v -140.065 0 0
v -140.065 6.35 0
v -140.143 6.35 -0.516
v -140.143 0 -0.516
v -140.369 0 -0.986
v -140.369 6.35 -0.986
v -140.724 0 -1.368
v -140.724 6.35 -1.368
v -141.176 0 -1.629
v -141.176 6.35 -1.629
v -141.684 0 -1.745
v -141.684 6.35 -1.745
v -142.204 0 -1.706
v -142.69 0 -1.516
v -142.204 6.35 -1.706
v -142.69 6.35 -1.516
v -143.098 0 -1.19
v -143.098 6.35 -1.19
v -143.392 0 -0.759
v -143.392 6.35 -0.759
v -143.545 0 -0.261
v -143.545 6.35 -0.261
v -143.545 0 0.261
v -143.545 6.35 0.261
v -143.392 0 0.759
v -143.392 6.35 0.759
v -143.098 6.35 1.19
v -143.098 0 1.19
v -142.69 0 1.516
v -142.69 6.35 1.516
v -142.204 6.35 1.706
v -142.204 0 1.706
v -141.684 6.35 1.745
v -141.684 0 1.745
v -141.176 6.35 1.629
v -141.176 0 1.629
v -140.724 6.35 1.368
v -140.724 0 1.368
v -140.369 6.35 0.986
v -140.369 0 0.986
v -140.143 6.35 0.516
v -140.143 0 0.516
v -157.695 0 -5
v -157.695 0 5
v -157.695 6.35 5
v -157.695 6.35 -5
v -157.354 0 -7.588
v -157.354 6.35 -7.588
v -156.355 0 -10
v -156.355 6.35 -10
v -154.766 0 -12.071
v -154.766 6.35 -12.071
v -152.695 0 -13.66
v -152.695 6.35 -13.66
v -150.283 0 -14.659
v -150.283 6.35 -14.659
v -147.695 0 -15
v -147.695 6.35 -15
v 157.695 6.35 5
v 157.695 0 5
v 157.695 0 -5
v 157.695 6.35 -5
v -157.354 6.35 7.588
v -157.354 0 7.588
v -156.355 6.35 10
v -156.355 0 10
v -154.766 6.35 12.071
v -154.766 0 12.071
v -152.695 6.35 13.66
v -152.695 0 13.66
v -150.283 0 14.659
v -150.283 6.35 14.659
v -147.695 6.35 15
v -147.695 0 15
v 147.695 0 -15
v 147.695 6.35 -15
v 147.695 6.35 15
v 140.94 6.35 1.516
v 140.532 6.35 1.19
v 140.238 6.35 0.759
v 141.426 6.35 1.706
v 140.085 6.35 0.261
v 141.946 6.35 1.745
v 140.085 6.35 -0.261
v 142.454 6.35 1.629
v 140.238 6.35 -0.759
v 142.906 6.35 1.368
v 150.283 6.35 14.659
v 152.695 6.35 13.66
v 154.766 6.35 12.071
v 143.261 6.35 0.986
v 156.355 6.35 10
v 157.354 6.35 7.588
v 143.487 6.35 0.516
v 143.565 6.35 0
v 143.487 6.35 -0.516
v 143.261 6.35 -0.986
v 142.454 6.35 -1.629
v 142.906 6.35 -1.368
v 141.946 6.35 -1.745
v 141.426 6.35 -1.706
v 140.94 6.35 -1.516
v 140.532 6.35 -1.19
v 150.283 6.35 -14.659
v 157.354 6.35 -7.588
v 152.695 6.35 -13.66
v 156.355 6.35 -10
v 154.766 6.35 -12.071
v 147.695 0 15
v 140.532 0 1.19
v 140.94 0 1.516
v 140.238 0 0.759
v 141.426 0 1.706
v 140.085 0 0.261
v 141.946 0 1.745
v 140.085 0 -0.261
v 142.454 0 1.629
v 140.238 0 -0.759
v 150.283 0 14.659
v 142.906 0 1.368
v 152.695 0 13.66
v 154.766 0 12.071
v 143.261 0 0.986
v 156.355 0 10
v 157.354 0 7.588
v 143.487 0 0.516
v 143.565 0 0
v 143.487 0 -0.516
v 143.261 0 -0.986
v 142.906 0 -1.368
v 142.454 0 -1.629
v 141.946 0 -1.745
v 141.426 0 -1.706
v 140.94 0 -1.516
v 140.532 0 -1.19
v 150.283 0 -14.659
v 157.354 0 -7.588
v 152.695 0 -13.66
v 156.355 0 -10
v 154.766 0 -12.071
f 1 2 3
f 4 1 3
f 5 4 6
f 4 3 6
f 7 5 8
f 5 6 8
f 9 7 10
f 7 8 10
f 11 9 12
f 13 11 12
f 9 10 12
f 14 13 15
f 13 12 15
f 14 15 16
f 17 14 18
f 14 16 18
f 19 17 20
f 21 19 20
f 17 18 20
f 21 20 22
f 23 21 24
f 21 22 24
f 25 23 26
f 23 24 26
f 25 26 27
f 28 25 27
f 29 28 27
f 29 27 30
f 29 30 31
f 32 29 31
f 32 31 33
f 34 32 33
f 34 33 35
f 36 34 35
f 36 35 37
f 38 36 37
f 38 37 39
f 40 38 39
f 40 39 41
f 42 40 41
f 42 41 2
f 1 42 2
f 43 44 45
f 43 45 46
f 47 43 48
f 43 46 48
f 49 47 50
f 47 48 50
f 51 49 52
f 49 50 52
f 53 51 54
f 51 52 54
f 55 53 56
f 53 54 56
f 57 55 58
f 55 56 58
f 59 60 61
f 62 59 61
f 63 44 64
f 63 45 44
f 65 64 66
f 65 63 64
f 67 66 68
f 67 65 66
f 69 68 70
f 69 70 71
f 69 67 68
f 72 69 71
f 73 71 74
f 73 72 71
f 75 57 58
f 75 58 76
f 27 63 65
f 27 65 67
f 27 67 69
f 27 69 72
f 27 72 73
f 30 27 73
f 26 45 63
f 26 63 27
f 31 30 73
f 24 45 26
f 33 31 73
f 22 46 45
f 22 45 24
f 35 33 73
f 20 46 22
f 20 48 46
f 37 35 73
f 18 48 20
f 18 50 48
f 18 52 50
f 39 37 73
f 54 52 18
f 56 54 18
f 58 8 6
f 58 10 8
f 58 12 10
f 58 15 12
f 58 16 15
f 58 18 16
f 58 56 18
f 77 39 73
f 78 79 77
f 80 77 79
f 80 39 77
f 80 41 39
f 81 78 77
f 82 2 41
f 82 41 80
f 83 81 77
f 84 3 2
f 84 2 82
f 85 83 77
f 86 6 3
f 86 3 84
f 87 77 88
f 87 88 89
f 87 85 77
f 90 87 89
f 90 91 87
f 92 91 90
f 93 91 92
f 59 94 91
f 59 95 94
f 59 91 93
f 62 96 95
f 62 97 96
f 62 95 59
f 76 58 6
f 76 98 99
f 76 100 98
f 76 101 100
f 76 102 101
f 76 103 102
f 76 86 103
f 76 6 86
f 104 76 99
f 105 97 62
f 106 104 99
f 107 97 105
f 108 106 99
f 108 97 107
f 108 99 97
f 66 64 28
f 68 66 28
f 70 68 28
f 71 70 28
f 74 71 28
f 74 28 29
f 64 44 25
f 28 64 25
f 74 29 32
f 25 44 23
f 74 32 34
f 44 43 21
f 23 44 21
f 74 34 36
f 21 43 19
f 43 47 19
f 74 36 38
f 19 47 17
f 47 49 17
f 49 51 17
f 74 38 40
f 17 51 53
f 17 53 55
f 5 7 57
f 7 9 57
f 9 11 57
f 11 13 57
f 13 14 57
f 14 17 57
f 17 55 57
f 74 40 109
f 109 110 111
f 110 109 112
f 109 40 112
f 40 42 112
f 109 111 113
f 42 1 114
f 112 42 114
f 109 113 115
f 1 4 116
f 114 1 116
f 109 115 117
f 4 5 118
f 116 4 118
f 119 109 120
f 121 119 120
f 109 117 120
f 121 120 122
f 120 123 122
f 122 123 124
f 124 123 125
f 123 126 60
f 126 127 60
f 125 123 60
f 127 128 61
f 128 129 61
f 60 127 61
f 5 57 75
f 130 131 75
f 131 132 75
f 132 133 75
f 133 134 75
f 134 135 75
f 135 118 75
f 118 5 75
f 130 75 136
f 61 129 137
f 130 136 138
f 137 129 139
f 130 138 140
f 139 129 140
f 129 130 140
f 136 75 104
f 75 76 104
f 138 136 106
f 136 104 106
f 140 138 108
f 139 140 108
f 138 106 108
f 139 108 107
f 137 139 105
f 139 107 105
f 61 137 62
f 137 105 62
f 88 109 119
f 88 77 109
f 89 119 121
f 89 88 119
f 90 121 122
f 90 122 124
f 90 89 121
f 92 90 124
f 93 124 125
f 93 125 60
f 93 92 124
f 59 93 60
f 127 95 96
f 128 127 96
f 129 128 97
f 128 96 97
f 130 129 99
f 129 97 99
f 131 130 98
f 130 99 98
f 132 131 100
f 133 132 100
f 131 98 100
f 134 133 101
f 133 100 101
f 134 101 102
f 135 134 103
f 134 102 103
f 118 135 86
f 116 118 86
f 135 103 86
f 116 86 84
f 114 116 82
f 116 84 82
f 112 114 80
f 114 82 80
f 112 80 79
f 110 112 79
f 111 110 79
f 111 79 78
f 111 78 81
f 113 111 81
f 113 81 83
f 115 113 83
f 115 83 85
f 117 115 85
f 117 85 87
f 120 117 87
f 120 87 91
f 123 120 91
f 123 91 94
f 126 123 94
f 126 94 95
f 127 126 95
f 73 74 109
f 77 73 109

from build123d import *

# Parameters (mm, degrees)
SKETCH1_W           = 315.39
SKETCH1_H           = 30
BOSS_EXTRUDE1_DEPTH = 6.35
SKETCH4_R           = 1.75
CUT_EXTRUDE3_DEPTH  = 7.35
FILLET3_R           = 10


with BuildPart() as part:
    # Sketch1 → Boss-Extrude1 (new body)
    with BuildSketch(Plane(origin=(0, 0, 0), x_dir=(1, 0, 0), z_dir=(0, 1, 0))):
        Rectangle(SKETCH1_W, SKETCH1_H)
    extrude(amount=BOSS_EXTRUDE1_DEPTH)

    # Sketch4 → Cut-Extrude3 (cut, through all)
    with BuildSketch(Plane(origin=(0, 6.35, 0), x_dir=(1, 0, 0), z_dir=(0, 1, 0))):
        with Locations((-141.815, 0)):
            Circle(SKETCH4_R)
        with Locations((141.815, 0)):
            Circle(SKETCH4_R)
    extrude(amount=-CUT_EXTRUDE3_DEPTH, mode=Mode.SUBTRACT)

    # Fillet3
    fillet3_edges = [part.edges().sort_by_distance(p)[0] for p in [
        (157.695, 3.175, 15),
        (-157.695, 3.175, 15),
        (-157.695, 3.175, -15),
        (157.695, 3.175, -15),
    ]]
    fillet(fillet3_edges, radius=FILLET3_R)


solid = part.part
